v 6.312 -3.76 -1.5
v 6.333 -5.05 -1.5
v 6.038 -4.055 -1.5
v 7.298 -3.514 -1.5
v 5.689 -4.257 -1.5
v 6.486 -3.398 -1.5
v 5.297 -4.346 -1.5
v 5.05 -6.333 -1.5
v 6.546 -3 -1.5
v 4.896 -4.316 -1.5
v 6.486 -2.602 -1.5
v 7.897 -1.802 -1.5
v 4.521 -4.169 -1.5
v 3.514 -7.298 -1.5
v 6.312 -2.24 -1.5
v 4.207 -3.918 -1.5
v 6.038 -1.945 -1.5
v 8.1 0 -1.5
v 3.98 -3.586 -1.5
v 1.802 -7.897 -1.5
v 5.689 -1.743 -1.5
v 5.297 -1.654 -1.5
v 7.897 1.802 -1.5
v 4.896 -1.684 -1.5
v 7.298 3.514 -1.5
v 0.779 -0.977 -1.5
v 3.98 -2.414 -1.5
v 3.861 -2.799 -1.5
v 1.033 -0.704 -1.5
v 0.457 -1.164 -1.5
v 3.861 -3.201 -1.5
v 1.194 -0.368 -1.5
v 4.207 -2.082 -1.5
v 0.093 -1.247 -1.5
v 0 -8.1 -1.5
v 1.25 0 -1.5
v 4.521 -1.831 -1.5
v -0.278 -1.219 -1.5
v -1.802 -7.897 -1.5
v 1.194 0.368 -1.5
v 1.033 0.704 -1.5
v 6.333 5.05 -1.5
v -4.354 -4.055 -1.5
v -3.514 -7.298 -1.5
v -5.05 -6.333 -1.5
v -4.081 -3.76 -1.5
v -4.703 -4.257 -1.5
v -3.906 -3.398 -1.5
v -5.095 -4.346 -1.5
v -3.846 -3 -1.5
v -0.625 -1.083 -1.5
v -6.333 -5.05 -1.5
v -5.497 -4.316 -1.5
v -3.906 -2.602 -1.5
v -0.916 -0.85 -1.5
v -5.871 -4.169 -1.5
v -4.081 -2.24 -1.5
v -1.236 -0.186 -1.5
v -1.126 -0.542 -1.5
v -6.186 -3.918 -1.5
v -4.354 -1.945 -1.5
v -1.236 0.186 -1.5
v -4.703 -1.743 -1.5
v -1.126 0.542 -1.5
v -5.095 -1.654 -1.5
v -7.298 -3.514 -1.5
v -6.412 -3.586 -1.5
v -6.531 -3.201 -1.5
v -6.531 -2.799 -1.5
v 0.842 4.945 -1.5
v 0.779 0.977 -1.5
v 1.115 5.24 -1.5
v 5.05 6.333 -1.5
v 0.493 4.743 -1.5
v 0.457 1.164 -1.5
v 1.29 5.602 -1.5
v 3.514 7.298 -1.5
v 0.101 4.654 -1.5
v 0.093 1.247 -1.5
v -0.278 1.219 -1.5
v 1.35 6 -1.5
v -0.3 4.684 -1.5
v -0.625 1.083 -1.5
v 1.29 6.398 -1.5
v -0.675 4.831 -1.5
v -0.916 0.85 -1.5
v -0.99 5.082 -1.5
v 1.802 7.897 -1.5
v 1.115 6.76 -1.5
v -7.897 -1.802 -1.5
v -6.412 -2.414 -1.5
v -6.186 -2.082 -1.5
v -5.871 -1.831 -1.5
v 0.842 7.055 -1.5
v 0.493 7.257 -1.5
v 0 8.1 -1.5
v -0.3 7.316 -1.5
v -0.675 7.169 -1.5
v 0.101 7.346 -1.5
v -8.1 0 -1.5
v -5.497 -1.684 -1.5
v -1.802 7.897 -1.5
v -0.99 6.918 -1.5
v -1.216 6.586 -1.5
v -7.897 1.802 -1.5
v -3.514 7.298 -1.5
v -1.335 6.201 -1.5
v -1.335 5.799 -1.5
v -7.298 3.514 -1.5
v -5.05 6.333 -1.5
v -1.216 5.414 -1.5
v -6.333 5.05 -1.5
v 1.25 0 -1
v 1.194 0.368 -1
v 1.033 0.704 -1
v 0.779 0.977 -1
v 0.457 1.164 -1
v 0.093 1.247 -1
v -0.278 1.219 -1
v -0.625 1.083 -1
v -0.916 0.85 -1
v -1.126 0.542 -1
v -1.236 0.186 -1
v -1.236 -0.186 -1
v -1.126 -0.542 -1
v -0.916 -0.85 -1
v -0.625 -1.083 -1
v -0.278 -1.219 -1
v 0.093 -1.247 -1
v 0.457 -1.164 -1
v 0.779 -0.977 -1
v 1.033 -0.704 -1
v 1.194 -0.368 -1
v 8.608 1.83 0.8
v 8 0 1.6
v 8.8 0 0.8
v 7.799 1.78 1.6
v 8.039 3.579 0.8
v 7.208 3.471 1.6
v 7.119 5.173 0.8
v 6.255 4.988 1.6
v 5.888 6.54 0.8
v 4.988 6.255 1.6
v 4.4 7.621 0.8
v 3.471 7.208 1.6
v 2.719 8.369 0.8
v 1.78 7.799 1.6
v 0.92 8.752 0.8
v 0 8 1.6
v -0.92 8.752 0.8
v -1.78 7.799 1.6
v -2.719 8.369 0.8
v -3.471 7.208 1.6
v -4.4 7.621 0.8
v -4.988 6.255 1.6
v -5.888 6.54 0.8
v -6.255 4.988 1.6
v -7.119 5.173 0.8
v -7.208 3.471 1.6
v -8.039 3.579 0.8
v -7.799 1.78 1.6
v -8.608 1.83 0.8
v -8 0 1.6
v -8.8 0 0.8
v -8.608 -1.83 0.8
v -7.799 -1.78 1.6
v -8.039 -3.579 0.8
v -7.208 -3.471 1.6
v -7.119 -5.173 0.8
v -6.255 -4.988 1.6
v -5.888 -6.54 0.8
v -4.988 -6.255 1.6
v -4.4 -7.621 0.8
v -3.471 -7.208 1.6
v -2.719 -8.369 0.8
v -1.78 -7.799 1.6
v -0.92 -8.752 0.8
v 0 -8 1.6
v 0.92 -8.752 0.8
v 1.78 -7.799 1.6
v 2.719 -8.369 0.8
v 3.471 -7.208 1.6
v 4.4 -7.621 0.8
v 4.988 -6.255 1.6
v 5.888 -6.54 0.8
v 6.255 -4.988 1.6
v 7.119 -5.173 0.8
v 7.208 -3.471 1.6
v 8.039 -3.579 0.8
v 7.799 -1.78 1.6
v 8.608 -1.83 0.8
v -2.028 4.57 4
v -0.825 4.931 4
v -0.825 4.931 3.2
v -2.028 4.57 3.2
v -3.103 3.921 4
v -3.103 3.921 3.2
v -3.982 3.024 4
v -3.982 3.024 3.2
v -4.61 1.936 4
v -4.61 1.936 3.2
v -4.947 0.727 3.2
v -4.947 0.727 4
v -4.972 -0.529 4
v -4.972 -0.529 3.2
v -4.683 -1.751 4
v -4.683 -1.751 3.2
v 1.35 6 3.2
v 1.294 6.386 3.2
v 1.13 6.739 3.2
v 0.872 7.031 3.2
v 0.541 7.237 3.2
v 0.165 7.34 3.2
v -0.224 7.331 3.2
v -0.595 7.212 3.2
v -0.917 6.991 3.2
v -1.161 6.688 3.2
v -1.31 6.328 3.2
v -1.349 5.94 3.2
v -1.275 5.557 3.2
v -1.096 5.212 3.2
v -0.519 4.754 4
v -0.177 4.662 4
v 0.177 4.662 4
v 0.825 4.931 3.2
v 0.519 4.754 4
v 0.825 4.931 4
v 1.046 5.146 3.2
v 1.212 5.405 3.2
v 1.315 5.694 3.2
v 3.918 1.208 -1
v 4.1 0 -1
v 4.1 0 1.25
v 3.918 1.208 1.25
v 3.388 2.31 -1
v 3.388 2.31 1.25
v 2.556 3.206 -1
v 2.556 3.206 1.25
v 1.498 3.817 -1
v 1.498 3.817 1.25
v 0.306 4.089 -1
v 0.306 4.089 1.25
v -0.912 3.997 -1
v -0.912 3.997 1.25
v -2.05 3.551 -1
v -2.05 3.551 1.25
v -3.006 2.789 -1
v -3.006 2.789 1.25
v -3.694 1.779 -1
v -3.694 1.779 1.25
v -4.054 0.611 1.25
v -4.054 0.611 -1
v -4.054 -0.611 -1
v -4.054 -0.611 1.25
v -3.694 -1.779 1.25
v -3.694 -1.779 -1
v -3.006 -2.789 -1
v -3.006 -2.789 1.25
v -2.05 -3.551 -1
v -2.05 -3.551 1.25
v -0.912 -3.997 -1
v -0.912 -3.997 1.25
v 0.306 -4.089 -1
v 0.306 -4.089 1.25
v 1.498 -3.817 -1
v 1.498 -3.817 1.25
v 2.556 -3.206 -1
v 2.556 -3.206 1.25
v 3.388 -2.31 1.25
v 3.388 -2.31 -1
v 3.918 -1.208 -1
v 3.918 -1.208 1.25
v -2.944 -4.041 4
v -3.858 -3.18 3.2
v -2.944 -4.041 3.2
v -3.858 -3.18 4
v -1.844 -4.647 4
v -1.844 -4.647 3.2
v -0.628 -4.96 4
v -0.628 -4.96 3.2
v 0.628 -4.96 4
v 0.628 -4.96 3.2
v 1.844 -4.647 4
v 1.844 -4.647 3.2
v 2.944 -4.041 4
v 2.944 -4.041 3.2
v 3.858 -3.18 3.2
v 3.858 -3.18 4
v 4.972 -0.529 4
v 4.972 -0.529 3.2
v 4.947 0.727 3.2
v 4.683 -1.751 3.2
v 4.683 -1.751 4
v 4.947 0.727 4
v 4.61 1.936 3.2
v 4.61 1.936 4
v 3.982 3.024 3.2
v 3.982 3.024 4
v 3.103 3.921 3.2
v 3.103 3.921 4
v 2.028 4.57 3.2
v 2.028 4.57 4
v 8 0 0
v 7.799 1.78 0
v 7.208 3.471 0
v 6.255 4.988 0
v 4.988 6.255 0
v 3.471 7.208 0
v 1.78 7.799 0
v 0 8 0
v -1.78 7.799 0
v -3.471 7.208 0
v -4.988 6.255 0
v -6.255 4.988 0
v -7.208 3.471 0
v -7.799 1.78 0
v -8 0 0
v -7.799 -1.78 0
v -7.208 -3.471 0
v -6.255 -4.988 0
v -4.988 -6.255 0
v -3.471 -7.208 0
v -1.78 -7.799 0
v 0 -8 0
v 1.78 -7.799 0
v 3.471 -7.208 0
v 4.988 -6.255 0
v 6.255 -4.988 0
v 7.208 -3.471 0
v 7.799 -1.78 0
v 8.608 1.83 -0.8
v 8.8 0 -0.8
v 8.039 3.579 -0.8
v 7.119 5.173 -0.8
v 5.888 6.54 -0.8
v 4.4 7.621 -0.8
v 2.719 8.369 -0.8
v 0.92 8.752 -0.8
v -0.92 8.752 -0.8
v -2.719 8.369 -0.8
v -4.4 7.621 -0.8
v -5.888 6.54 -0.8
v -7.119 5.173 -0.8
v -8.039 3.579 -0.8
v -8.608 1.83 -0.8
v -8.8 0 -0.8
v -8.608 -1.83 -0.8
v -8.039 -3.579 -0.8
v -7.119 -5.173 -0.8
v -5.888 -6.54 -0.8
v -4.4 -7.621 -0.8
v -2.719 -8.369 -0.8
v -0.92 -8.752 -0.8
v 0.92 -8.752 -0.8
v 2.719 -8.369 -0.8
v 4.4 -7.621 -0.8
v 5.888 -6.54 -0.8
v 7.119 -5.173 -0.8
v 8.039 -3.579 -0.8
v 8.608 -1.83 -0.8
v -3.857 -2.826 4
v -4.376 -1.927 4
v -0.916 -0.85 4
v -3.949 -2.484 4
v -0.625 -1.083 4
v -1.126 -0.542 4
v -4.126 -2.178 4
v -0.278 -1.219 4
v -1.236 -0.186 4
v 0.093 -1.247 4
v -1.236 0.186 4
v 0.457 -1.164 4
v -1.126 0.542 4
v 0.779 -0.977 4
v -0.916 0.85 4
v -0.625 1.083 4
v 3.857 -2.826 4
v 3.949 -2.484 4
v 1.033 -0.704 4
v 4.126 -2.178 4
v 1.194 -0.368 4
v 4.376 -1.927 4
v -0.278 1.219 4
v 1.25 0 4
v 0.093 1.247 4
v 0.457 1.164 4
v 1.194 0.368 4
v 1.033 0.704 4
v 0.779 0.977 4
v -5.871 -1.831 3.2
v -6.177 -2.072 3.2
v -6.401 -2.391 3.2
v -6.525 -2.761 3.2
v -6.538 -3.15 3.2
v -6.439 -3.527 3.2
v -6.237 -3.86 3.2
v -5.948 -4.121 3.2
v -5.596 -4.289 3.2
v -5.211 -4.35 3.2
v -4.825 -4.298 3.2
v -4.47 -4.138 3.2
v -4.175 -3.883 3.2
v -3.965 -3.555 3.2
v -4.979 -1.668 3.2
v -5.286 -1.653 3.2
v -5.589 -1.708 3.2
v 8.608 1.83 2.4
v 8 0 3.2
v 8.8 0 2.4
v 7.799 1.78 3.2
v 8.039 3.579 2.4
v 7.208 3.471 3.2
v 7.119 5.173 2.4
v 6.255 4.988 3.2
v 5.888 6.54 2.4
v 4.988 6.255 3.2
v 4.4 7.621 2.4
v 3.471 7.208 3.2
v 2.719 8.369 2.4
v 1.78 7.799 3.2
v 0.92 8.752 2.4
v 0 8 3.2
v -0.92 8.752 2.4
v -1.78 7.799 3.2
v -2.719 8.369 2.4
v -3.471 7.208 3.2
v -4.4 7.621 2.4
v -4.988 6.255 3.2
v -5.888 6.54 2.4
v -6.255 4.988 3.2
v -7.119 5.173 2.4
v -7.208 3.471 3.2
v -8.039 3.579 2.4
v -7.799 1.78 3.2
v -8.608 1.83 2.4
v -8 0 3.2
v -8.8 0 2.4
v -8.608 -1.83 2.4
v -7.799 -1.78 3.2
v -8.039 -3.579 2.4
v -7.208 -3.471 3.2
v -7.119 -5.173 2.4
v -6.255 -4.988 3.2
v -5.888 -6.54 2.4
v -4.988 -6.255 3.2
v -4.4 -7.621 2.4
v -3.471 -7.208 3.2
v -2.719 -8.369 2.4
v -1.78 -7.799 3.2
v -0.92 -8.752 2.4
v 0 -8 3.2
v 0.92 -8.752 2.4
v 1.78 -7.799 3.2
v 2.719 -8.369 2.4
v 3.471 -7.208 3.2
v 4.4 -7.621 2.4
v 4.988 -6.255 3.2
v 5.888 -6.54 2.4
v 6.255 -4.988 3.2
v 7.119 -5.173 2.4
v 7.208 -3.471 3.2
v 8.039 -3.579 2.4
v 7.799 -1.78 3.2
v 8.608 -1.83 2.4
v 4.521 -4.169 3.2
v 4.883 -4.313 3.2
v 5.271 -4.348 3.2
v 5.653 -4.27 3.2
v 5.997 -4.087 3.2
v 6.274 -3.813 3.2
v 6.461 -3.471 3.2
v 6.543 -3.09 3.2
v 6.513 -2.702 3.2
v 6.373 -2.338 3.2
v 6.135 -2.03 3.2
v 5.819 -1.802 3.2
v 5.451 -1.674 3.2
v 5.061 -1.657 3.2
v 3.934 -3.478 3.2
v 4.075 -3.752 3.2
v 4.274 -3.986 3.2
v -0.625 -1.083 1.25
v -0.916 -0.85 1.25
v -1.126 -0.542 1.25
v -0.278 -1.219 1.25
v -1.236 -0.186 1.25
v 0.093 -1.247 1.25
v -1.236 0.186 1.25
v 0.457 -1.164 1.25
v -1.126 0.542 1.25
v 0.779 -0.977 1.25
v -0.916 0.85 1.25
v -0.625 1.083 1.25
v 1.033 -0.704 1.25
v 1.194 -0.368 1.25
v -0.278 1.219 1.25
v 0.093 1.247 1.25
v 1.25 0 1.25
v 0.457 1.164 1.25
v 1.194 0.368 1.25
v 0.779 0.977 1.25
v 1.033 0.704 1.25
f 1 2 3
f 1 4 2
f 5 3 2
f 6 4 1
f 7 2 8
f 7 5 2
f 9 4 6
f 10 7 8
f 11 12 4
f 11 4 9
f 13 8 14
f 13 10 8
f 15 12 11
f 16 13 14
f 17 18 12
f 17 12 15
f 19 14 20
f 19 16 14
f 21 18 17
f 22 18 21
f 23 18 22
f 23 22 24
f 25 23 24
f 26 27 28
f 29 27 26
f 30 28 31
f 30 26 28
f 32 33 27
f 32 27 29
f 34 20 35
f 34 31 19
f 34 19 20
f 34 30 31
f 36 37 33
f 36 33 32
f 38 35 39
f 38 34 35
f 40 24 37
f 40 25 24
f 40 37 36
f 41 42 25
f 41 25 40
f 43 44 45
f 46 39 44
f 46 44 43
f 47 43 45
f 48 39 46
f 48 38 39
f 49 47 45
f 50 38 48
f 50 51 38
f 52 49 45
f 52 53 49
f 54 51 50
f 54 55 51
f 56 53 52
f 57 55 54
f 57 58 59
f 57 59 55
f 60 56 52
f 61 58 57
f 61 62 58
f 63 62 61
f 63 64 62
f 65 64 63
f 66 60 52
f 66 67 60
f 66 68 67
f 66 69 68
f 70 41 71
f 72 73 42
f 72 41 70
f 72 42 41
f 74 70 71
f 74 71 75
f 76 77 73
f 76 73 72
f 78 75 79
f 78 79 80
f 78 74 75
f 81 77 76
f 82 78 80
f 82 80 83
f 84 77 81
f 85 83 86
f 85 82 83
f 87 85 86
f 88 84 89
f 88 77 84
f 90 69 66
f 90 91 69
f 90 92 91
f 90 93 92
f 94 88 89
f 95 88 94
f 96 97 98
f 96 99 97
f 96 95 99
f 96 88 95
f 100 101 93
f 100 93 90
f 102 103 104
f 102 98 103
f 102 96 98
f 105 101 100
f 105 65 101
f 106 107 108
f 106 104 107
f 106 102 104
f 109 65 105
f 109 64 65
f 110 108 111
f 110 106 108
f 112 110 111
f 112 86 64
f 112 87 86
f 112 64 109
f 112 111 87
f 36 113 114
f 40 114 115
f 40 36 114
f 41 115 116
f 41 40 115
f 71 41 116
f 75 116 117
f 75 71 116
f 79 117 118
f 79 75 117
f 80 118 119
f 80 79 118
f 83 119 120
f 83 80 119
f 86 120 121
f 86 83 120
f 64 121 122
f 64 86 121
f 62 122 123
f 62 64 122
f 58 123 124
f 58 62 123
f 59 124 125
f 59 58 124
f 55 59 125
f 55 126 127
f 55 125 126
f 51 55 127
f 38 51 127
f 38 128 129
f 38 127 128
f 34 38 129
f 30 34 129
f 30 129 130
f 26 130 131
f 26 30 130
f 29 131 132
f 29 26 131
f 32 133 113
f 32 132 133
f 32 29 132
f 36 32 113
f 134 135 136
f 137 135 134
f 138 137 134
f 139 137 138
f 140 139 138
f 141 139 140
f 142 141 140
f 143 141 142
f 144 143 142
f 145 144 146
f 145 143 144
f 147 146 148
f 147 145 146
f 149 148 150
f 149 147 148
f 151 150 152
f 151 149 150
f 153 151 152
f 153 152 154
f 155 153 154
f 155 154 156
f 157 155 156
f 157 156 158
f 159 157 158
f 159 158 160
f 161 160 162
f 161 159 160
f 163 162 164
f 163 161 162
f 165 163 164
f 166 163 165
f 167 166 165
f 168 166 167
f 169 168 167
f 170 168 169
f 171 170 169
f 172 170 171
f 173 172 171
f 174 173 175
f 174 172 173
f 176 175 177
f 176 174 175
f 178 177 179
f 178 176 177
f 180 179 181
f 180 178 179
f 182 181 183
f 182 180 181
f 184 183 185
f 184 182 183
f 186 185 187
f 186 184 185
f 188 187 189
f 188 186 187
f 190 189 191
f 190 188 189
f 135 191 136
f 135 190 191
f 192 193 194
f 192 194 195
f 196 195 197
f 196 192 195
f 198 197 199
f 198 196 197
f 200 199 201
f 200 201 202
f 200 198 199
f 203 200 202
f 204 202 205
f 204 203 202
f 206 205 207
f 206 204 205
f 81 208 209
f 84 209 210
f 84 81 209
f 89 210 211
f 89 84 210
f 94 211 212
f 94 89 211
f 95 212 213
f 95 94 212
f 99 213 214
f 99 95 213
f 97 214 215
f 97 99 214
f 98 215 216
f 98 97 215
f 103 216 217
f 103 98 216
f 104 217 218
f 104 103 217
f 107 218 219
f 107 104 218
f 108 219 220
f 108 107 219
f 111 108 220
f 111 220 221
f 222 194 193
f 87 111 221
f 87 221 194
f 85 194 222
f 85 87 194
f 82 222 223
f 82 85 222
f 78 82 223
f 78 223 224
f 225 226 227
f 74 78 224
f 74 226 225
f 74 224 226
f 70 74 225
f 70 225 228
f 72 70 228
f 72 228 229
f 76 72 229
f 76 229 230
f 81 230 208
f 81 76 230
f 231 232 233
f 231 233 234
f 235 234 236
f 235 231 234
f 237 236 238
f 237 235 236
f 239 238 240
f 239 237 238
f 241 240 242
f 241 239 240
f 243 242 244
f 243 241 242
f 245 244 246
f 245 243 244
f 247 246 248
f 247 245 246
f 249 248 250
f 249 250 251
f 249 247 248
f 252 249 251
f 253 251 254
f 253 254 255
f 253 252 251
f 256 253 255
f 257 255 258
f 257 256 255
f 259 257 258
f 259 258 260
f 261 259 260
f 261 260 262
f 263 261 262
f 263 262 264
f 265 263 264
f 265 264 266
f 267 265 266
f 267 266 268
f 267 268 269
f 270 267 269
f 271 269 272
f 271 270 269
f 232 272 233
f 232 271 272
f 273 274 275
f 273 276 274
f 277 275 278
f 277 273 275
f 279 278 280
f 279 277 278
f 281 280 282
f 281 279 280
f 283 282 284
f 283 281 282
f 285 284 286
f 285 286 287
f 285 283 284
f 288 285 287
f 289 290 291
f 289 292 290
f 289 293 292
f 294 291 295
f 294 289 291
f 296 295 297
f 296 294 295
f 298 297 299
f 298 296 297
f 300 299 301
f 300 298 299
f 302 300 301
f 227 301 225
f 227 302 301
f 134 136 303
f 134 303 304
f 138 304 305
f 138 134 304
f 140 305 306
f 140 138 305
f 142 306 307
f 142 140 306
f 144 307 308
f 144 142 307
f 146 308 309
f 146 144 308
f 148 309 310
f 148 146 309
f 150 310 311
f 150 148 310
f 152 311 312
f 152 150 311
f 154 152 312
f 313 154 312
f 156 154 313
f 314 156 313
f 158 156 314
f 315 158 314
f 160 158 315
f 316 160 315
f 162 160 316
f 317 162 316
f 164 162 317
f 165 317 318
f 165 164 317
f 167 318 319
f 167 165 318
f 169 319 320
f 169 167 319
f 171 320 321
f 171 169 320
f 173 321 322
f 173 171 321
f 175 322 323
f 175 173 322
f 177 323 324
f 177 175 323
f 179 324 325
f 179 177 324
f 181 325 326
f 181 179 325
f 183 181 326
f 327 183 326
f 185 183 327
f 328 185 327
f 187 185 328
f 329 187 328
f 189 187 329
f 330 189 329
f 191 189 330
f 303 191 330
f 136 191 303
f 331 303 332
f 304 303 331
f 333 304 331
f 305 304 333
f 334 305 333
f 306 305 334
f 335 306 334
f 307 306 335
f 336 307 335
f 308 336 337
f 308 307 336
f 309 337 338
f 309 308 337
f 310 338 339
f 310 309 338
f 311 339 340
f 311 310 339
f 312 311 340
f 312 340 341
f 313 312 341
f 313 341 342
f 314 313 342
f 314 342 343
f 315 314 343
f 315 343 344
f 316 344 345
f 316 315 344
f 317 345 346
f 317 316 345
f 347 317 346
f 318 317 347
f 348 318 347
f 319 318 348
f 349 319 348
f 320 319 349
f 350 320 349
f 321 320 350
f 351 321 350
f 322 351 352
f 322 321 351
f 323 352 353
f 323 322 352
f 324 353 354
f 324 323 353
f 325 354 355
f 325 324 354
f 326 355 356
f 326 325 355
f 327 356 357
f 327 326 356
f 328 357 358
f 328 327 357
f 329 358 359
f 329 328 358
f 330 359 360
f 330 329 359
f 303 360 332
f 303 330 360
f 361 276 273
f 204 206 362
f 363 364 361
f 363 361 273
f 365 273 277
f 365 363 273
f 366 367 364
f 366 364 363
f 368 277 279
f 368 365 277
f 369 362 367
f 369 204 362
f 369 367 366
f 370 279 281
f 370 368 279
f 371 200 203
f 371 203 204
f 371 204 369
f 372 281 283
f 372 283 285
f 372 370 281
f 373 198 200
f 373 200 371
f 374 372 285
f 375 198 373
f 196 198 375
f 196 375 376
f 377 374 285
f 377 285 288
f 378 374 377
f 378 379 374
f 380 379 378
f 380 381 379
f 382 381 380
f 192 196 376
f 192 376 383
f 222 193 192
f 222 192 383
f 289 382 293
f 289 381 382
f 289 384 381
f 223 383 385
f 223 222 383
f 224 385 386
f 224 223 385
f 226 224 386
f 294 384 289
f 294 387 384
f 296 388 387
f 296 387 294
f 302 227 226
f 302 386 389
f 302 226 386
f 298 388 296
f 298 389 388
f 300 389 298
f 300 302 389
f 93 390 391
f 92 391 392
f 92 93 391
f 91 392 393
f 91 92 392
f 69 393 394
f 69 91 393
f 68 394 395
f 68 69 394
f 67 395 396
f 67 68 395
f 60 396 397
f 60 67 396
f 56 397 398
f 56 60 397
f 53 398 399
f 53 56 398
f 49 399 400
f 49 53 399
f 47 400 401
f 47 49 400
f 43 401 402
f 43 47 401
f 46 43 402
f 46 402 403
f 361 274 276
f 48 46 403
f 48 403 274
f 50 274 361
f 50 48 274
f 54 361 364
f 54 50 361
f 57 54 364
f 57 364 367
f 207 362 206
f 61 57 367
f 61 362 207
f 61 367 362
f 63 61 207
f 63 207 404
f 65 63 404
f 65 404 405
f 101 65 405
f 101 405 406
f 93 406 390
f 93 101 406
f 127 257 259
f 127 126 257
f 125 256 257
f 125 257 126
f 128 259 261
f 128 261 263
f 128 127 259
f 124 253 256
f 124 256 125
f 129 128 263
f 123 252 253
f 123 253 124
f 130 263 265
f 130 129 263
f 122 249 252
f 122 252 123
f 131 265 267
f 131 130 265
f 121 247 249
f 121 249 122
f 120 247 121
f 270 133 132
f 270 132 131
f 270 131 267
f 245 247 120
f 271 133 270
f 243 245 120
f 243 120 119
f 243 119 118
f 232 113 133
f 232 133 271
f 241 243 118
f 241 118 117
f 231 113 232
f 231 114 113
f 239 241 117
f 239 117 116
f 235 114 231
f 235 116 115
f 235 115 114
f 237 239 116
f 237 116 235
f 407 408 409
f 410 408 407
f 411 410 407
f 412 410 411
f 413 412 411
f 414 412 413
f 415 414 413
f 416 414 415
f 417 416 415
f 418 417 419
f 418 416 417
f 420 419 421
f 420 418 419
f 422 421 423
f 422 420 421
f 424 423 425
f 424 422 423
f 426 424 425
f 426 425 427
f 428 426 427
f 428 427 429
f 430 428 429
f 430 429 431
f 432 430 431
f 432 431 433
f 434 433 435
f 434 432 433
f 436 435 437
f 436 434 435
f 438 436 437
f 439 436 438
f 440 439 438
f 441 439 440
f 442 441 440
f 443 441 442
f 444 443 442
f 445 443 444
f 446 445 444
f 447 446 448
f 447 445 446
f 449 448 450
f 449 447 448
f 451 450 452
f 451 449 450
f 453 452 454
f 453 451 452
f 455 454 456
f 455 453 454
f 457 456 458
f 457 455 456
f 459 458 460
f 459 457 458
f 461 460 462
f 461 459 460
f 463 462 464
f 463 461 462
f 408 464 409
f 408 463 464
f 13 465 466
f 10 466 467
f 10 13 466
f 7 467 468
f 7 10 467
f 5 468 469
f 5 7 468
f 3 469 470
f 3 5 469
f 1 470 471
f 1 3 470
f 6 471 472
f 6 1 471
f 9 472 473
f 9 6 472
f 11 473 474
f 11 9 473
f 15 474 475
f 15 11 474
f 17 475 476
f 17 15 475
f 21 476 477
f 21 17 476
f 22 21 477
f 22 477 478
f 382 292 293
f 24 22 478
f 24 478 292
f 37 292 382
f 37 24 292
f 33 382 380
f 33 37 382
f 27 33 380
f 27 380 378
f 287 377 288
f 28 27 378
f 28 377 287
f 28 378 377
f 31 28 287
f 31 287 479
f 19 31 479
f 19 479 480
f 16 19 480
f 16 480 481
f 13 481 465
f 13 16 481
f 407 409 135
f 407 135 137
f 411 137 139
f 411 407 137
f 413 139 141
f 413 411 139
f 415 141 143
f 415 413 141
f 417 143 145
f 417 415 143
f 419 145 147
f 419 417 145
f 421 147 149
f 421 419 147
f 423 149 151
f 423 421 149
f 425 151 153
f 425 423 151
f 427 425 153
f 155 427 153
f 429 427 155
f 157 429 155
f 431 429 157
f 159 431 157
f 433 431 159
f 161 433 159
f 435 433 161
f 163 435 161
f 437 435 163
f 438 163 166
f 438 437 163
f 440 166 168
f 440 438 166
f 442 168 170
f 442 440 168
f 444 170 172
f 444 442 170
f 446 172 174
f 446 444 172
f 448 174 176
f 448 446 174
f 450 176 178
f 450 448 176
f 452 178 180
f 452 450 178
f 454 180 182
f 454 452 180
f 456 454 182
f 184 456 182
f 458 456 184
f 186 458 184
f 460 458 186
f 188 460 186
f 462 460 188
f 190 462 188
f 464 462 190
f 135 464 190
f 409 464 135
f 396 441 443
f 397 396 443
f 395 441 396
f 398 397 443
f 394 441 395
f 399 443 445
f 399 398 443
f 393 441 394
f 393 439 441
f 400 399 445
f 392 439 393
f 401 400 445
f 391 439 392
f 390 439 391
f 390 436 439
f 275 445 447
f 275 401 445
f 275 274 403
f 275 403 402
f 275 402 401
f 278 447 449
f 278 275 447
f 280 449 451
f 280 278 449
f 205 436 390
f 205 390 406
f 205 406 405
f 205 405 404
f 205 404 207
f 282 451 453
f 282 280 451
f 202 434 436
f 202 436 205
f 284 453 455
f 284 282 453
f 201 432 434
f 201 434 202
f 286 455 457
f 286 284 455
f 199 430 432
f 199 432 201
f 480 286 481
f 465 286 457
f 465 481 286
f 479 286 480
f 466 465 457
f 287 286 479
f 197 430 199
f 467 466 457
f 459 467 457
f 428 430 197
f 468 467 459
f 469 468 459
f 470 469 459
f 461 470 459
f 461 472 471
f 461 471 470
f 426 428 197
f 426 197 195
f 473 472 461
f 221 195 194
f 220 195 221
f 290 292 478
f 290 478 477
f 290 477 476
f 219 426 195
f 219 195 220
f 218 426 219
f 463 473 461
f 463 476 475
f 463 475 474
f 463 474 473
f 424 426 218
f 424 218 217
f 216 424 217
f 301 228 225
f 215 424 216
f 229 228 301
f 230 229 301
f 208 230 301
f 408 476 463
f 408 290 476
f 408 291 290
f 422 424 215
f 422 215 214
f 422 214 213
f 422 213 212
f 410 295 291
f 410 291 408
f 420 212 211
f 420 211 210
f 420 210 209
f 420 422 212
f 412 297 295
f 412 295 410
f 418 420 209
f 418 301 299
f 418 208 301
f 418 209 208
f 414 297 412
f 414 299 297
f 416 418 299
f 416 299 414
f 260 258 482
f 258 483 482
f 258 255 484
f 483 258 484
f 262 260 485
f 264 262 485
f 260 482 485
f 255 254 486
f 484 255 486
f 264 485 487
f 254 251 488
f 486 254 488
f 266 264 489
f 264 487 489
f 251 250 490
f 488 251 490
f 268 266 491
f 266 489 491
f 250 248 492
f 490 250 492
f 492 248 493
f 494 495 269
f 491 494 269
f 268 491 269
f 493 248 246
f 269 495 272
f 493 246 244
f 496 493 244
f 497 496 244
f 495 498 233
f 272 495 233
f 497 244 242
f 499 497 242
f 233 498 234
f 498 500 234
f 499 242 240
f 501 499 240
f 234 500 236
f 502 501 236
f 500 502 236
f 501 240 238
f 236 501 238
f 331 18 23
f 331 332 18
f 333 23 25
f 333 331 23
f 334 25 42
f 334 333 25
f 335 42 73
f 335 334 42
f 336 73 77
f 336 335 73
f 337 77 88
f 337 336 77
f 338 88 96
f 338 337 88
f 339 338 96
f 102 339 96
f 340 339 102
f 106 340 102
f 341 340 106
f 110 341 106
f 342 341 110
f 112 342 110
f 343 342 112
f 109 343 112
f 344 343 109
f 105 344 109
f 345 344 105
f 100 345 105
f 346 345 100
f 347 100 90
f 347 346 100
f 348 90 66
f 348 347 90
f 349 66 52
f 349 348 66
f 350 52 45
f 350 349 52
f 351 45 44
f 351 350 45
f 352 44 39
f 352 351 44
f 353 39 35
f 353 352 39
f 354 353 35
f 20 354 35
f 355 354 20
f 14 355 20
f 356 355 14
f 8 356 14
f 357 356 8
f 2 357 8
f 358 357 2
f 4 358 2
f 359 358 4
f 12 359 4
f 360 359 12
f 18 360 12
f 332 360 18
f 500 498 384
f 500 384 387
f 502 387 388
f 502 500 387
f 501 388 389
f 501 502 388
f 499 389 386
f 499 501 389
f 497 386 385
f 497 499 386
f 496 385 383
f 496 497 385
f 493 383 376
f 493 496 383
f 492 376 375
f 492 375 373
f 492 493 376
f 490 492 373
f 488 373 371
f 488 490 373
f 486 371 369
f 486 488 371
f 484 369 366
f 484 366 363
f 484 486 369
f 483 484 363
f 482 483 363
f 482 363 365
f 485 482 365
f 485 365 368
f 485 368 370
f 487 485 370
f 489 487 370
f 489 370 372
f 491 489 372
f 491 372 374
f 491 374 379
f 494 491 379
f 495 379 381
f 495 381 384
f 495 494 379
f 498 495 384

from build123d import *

# Parameters (mm, degrees)
CYLINDER001_R     = 1.35
CYLINDER001_DEPTH = 10
ARRAY001_COUNT    = 3
CYLINDER_R        = 4.1
CYLINDER_DEPTH    = 2.25
SKETCH002_W       = 5
SKETCH002_H       = 4.7
ARRAY_Z_COUNT     = 6
ARRAY_Z_PITCH     = 1.6


with BuildPart() as dins913:
    # Cylinder001 → Cylinder001 (new body)
    with BuildSketch(Plane(origin=(0, 6, -4), x_dir=(1, 0, 0), z_dir=(0, 0, 1))):
        Circle(CYLINDER001_R)
    extrude(amount=CYLINDER001_DEPTH)

    # Array001: DINs913 ×3 about axis
    array001_axis = Axis((0, 0, 0), (0, 0, 1))


with BuildPart() as dins913_1:
    add(dins913.part)
    for i in range(1, ARRAY001_COUNT):
        add(dins913.part.rotate(array001_axis, i * 360 / ARRAY001_COUNT))


with BuildPart() as lensfit:
    # Cylinder → Cylinder (new body)
    with BuildSketch(Plane.XY.offset(-1)):
        Circle(CYLINDER_R)
    extrude(amount=CYLINDER_DEPTH)


with BuildPart() as innergroovedom001:
    # Sketch002 → Revolution002 (revolve)
    with BuildSketch(Plane.XZ):
        with Locations((7.5, 0.85)):
            Rectangle(SKETCH002_W, SKETCH002_H)
    revolve(axis=Axis((0, 0, 0), (0, 0, 1)))


with BuildPart() as innergroovetool:
    # Sketch001 → Revolution001 (revolve)
    with BuildSketch(Plane.XZ):
        Polygon((4, 3.2), (4, 1.6), (8, 1.6), (8.8, 2.4), (8, 3.2), align=None)
    revolve(axis=Axis((0, 0, 0), (0, 0, 1)))

    # Array Z: InnerGrooveTool ×6


with BuildPart() as innergroovetool_1:
    add(innergroovetool.part)
    with Locations(*[(0, 0, -i * ARRAY_Z_PITCH) for i in range(1, ARRAY_Z_COUNT)]):
        add(innergroovetool.part)

    # Common: intersect InnerGrooveDom001
    add(innergroovedom001.part, mode=Mode.INTERSECT)


with BuildPart() as boltcuts:
    # Sketch → Revolution (revolve)
    with BuildSketch(Plane.XZ):
        Polygon((1.25, 4), (1.25, -1.5), (8, -1.5), (8, 3.2), (5, 3.2), (5, 4), align=None)
    revolve(axis=Axis((0, 0, 0), (0, 0, 1)))

    # Fusion001: union InnerGrooveTool
    add(innergroovetool_1.part)

    # Cut: cut LensFit
    add(lensfit.part, mode=Mode.SUBTRACT)

    # Cut001: cut DINs913
    add(dins913_1.part, mode=Mode.SUBTRACT)


solid = boltcuts.part
